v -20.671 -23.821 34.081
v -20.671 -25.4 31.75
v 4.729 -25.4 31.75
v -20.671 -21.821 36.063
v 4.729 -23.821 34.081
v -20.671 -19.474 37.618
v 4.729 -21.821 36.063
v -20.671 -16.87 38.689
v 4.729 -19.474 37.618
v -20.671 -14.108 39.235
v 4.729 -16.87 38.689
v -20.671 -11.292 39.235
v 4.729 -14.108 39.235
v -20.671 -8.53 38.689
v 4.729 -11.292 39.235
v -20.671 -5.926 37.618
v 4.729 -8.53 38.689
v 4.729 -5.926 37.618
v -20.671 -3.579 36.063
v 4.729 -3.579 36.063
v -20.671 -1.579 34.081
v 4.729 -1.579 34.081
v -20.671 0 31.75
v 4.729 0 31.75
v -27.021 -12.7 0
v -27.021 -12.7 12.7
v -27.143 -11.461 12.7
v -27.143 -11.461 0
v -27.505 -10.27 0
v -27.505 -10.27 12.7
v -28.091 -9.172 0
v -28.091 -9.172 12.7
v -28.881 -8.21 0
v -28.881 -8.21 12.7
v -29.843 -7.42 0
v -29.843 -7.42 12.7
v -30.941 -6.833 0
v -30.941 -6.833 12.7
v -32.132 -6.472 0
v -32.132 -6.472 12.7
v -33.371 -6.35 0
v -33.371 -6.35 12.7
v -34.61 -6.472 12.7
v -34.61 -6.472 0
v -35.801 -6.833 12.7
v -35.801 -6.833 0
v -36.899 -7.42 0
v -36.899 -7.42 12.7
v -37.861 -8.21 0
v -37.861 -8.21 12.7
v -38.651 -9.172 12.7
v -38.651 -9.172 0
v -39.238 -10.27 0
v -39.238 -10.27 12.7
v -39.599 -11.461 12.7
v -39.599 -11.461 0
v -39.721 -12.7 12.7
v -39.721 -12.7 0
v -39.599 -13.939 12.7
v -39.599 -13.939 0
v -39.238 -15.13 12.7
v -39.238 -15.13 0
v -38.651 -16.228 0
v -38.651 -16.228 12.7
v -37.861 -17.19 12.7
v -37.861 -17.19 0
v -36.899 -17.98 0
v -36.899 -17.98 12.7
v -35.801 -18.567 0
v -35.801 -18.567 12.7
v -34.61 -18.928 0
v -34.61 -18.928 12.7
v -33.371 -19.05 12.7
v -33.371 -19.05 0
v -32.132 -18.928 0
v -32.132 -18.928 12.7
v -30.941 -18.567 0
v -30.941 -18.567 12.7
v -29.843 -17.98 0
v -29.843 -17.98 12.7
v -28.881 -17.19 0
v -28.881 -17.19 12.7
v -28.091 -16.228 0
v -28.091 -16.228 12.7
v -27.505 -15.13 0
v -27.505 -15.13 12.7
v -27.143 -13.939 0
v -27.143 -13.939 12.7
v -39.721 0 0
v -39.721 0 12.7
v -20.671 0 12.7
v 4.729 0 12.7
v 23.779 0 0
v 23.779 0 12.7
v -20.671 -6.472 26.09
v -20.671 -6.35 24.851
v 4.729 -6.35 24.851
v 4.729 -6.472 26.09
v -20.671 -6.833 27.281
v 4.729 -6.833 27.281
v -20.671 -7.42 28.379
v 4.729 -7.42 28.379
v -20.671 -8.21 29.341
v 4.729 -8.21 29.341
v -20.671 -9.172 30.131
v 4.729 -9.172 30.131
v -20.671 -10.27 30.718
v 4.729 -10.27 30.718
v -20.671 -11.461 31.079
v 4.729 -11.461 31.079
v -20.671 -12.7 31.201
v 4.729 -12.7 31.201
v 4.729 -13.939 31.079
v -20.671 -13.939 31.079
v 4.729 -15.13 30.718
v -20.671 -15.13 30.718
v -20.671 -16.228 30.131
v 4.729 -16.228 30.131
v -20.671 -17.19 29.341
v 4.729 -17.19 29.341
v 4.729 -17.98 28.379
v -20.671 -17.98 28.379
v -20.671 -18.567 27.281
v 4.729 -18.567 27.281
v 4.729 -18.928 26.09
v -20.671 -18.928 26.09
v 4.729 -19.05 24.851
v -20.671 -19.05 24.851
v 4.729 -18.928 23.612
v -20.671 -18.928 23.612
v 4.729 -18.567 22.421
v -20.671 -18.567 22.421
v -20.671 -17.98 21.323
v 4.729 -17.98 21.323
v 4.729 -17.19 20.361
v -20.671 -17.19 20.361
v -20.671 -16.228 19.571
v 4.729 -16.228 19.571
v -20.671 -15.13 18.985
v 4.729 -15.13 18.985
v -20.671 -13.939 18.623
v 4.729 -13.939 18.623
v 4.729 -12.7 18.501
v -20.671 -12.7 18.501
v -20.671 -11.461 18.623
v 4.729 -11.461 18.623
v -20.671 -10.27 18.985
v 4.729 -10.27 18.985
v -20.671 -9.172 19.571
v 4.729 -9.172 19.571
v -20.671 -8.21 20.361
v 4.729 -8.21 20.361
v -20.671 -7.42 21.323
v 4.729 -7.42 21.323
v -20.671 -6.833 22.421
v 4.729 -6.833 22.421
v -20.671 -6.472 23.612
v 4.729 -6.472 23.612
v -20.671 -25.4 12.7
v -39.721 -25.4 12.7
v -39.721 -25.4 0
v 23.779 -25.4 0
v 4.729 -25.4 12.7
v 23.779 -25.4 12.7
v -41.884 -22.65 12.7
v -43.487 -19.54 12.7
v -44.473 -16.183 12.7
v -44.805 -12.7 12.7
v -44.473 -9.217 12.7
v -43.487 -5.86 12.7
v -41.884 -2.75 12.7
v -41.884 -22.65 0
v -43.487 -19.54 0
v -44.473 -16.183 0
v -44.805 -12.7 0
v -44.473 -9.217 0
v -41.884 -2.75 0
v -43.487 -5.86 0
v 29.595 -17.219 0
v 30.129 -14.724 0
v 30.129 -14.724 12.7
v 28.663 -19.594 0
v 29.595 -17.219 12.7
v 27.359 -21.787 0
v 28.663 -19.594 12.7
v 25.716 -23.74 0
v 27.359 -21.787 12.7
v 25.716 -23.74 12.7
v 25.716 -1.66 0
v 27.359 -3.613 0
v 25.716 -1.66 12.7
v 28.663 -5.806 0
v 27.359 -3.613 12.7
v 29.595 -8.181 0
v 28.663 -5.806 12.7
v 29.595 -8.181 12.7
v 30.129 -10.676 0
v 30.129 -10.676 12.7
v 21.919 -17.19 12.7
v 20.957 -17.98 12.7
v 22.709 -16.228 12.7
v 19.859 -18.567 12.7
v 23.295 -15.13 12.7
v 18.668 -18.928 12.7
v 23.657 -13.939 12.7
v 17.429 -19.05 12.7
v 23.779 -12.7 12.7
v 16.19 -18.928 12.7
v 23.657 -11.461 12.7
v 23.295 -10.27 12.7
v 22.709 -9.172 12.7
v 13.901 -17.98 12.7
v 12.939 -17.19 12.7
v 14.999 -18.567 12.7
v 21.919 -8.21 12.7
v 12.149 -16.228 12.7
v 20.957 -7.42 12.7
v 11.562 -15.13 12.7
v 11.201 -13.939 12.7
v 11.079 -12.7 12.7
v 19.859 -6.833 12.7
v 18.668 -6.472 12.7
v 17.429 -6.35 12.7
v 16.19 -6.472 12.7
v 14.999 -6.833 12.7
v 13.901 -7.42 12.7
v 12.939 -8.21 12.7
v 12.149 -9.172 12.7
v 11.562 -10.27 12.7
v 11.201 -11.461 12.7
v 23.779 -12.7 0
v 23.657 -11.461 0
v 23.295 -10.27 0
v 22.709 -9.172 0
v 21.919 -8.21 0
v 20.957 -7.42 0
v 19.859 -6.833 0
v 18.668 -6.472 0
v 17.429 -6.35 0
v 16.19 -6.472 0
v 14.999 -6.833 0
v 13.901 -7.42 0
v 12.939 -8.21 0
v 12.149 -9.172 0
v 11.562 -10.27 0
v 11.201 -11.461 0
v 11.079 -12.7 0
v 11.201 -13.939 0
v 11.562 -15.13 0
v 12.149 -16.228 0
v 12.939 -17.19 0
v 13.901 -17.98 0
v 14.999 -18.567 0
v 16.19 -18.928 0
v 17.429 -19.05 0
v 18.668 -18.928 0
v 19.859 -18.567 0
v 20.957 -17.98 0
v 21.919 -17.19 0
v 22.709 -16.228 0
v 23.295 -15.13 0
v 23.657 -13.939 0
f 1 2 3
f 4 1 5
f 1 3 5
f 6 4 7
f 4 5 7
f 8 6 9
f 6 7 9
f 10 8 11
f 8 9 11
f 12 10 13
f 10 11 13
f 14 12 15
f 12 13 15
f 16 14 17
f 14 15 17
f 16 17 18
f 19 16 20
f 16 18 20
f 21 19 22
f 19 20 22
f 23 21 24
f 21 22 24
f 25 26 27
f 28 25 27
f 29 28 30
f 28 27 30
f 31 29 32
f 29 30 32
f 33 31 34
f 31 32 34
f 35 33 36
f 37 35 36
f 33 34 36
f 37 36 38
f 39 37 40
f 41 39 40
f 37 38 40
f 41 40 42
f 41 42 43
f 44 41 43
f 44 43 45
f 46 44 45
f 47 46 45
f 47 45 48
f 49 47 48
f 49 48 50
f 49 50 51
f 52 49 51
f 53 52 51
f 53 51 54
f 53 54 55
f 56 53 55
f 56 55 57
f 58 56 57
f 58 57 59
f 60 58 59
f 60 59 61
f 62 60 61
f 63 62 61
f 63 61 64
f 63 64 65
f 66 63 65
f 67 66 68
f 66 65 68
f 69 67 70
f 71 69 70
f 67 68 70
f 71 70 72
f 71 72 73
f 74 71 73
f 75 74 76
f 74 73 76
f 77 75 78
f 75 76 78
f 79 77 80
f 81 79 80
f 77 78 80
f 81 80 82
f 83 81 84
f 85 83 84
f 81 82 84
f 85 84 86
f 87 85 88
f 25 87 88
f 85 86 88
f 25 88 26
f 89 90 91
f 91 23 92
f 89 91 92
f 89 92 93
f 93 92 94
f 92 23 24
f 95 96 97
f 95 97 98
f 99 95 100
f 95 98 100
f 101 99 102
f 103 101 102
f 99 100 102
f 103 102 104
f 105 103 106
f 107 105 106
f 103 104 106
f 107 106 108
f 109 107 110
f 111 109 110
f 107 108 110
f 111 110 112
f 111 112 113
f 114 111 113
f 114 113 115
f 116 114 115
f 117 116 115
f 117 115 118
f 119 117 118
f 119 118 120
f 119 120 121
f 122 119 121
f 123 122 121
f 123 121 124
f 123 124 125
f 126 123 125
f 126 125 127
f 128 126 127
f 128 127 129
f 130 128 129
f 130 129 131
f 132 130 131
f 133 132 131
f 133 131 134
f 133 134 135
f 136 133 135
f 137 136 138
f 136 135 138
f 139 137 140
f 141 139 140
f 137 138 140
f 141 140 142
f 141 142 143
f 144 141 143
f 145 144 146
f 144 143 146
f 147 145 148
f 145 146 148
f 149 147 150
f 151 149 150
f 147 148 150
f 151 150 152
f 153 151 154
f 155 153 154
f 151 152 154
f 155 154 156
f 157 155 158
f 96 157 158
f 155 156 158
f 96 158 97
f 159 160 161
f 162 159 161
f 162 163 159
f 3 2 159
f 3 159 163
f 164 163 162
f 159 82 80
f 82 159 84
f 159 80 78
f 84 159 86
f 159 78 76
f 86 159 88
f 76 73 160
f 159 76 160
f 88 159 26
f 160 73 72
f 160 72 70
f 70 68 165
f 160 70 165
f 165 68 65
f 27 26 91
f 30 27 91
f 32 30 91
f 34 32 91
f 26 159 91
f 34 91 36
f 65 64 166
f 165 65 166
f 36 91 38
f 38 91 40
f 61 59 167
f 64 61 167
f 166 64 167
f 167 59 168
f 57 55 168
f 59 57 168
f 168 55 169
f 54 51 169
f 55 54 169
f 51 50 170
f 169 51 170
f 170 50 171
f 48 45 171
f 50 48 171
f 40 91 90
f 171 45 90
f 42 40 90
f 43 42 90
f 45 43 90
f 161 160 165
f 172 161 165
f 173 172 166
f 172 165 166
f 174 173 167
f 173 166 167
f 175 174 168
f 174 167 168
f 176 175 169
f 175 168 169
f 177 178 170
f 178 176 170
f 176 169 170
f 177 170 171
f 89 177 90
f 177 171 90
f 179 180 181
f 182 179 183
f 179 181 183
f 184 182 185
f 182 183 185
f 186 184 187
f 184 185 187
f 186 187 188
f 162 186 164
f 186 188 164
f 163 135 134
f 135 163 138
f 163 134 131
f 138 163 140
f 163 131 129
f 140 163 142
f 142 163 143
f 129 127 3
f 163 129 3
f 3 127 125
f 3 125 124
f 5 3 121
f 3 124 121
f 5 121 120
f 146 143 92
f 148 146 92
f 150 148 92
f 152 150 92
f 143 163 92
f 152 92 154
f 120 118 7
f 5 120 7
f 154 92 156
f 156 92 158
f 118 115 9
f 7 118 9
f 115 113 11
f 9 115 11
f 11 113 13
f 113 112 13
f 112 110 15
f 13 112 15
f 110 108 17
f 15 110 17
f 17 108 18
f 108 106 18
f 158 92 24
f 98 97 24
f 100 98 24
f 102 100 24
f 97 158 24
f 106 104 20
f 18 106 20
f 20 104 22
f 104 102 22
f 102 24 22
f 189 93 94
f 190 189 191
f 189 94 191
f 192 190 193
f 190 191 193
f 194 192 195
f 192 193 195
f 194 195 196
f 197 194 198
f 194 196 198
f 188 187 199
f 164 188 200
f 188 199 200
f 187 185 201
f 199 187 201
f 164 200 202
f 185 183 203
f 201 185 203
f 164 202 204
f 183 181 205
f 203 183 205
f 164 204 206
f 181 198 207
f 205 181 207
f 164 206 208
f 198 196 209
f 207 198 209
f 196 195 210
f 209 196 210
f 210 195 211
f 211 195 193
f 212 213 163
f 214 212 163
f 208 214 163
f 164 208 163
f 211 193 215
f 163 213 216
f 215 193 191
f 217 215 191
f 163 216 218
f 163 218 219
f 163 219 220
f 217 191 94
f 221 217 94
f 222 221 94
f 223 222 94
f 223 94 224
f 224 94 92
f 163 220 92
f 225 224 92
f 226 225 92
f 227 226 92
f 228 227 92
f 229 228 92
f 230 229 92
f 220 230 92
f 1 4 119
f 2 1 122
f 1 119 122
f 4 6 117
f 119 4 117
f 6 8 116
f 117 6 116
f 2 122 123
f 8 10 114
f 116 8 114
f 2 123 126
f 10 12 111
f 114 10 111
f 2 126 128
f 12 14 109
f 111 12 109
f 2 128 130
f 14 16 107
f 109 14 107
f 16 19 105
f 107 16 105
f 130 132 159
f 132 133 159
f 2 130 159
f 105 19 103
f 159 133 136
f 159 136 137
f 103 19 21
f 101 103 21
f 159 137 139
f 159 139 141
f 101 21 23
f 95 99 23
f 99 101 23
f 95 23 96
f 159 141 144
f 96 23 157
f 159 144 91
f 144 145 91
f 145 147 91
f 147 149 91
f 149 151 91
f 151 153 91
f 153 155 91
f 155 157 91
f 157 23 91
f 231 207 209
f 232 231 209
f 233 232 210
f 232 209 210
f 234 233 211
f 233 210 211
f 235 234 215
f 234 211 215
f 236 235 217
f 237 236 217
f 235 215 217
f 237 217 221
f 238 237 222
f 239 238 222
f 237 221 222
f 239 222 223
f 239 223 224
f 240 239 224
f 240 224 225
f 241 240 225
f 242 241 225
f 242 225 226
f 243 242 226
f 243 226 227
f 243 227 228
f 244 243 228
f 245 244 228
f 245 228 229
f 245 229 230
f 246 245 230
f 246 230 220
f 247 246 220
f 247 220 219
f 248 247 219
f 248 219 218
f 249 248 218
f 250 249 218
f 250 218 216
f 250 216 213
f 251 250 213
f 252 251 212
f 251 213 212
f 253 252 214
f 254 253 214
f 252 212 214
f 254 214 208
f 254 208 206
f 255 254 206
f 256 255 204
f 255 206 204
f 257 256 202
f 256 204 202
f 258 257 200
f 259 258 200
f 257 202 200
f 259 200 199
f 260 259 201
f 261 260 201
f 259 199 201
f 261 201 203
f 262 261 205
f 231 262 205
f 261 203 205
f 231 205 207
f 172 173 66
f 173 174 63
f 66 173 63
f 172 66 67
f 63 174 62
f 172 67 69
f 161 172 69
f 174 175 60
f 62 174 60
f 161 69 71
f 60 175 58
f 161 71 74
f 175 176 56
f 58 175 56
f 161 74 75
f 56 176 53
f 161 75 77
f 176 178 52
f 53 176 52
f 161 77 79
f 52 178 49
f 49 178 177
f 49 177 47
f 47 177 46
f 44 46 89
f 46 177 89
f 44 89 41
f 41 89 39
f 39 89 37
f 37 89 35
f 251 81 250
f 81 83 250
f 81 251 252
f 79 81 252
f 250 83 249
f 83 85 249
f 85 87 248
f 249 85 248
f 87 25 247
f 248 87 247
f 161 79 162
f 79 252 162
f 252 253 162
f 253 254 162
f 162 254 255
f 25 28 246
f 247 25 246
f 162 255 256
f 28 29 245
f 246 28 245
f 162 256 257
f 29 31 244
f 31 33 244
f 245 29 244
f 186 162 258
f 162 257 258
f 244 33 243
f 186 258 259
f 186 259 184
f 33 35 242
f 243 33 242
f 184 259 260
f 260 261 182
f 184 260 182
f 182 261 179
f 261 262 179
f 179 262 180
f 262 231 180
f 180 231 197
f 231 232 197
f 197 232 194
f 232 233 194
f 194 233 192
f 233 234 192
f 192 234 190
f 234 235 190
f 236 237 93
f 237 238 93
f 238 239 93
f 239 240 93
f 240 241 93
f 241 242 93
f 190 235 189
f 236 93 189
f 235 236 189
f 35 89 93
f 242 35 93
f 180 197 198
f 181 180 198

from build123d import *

# Parameters (mm, degrees)
F1_DEPTH = 25.4
F2_R     = 6.35
F3_DEPTH = 12.701
F4_R     = 6.35
F5_DEPTH = 50.801
F7_DEPTH = 12.701
F9_DEPTH = 12.701


with BuildPart() as f1:
    # F0 (on Front) → F1 (new body)
    with BuildSketch(Plane.XZ):
        Polygon((-20.6712735461, 12.7), (-46.0712735461, 12.7), (-46.0712735461, 0), (30.1287264539, 0), (30.1287264539, 12.7), (4.7287264539, 12.7), (4.7287264539, 44.45), (-20.6712735461, 44.45), align=None)
    extrude(amount=F1_DEPTH)

    # F2 (on face) → F3 (cut, through all)
    with BuildSketch(Plane.XY.offset(12.7)):
        with Locations((17.4287264539, -12.7)):
            Circle(F2_R)
        with Locations((-33.3712735461, -12.7)):
            Circle(F2_R)
    extrude(amount=-F3_DEPTH, mode=Mode.SUBTRACT)

    # F4 (on face) → F5 (cut, through all)
    with BuildSketch(Plane.YZ.offset(4.7287264539)):
        with Locations((-12.7, 24.8512161426)):
            Circle(F4_R)
        with BuildLine():
            ThreePointArc((-25.4, 31.75), (-12.7, 39.3040089077), (0, 31.75))
            Line((0, 31.75), (0, 44.45))
            Line((0, 44.45), (-25.4, 44.45))
            Line((-25.4, 44.45), (-25.4, 31.75))
        make_face()
    extrude(amount=-F5_DEPTH, mode=Mode.SUBTRACT)

    # F6 (on face) → F7 (cut, through all)
    with BuildSketch(Plane.XY.offset(12.7)):
        with BuildLine():
            ThreePointArc((-39.7212735461, -25.4), (-44.8051245149, -12.7), (-39.7212735461, 0))
            Line((-39.7212735461, 0), (-46.0712735461, 0))
            Line((-46.0712735461, 0), (-46.0712735461, -25.4))
            Line((-46.0712735461, -25.4), (-39.7212735461, -25.4))
        make_face()
    extrude(amount=-F7_DEPTH, mode=Mode.SUBTRACT)

    # F8 (on face) → F9 (cut, through all)
    with BuildSketch(Plane.XY.offset(12.7)):
        with BuildLine():
            ThreePointArc((23.7787264539, 0), (28.0557438818, -4.6825889157), (30.1287264539, -10.6761071051))
            Line((30.1287264539, -10.6761071051), (30.1287264539, 0))
            Line((30.1287264539, 0), (23.7787264539, 0))
        make_face()
        with BuildLine():
            ThreePointArc((30.1287264539, -14.7238928949), (28.0557438818, -20.7174110843), (23.7787264539, -25.4))
            Line((23.7787264539, -25.4), (30.1287264539, -25.4))
            Line((30.1287264539, -25.4), (30.1287264539, -14.7238928949))
        make_face()
    extrude(amount=-F9_DEPTH, mode=Mode.SUBTRACT)


solid = f1.part
